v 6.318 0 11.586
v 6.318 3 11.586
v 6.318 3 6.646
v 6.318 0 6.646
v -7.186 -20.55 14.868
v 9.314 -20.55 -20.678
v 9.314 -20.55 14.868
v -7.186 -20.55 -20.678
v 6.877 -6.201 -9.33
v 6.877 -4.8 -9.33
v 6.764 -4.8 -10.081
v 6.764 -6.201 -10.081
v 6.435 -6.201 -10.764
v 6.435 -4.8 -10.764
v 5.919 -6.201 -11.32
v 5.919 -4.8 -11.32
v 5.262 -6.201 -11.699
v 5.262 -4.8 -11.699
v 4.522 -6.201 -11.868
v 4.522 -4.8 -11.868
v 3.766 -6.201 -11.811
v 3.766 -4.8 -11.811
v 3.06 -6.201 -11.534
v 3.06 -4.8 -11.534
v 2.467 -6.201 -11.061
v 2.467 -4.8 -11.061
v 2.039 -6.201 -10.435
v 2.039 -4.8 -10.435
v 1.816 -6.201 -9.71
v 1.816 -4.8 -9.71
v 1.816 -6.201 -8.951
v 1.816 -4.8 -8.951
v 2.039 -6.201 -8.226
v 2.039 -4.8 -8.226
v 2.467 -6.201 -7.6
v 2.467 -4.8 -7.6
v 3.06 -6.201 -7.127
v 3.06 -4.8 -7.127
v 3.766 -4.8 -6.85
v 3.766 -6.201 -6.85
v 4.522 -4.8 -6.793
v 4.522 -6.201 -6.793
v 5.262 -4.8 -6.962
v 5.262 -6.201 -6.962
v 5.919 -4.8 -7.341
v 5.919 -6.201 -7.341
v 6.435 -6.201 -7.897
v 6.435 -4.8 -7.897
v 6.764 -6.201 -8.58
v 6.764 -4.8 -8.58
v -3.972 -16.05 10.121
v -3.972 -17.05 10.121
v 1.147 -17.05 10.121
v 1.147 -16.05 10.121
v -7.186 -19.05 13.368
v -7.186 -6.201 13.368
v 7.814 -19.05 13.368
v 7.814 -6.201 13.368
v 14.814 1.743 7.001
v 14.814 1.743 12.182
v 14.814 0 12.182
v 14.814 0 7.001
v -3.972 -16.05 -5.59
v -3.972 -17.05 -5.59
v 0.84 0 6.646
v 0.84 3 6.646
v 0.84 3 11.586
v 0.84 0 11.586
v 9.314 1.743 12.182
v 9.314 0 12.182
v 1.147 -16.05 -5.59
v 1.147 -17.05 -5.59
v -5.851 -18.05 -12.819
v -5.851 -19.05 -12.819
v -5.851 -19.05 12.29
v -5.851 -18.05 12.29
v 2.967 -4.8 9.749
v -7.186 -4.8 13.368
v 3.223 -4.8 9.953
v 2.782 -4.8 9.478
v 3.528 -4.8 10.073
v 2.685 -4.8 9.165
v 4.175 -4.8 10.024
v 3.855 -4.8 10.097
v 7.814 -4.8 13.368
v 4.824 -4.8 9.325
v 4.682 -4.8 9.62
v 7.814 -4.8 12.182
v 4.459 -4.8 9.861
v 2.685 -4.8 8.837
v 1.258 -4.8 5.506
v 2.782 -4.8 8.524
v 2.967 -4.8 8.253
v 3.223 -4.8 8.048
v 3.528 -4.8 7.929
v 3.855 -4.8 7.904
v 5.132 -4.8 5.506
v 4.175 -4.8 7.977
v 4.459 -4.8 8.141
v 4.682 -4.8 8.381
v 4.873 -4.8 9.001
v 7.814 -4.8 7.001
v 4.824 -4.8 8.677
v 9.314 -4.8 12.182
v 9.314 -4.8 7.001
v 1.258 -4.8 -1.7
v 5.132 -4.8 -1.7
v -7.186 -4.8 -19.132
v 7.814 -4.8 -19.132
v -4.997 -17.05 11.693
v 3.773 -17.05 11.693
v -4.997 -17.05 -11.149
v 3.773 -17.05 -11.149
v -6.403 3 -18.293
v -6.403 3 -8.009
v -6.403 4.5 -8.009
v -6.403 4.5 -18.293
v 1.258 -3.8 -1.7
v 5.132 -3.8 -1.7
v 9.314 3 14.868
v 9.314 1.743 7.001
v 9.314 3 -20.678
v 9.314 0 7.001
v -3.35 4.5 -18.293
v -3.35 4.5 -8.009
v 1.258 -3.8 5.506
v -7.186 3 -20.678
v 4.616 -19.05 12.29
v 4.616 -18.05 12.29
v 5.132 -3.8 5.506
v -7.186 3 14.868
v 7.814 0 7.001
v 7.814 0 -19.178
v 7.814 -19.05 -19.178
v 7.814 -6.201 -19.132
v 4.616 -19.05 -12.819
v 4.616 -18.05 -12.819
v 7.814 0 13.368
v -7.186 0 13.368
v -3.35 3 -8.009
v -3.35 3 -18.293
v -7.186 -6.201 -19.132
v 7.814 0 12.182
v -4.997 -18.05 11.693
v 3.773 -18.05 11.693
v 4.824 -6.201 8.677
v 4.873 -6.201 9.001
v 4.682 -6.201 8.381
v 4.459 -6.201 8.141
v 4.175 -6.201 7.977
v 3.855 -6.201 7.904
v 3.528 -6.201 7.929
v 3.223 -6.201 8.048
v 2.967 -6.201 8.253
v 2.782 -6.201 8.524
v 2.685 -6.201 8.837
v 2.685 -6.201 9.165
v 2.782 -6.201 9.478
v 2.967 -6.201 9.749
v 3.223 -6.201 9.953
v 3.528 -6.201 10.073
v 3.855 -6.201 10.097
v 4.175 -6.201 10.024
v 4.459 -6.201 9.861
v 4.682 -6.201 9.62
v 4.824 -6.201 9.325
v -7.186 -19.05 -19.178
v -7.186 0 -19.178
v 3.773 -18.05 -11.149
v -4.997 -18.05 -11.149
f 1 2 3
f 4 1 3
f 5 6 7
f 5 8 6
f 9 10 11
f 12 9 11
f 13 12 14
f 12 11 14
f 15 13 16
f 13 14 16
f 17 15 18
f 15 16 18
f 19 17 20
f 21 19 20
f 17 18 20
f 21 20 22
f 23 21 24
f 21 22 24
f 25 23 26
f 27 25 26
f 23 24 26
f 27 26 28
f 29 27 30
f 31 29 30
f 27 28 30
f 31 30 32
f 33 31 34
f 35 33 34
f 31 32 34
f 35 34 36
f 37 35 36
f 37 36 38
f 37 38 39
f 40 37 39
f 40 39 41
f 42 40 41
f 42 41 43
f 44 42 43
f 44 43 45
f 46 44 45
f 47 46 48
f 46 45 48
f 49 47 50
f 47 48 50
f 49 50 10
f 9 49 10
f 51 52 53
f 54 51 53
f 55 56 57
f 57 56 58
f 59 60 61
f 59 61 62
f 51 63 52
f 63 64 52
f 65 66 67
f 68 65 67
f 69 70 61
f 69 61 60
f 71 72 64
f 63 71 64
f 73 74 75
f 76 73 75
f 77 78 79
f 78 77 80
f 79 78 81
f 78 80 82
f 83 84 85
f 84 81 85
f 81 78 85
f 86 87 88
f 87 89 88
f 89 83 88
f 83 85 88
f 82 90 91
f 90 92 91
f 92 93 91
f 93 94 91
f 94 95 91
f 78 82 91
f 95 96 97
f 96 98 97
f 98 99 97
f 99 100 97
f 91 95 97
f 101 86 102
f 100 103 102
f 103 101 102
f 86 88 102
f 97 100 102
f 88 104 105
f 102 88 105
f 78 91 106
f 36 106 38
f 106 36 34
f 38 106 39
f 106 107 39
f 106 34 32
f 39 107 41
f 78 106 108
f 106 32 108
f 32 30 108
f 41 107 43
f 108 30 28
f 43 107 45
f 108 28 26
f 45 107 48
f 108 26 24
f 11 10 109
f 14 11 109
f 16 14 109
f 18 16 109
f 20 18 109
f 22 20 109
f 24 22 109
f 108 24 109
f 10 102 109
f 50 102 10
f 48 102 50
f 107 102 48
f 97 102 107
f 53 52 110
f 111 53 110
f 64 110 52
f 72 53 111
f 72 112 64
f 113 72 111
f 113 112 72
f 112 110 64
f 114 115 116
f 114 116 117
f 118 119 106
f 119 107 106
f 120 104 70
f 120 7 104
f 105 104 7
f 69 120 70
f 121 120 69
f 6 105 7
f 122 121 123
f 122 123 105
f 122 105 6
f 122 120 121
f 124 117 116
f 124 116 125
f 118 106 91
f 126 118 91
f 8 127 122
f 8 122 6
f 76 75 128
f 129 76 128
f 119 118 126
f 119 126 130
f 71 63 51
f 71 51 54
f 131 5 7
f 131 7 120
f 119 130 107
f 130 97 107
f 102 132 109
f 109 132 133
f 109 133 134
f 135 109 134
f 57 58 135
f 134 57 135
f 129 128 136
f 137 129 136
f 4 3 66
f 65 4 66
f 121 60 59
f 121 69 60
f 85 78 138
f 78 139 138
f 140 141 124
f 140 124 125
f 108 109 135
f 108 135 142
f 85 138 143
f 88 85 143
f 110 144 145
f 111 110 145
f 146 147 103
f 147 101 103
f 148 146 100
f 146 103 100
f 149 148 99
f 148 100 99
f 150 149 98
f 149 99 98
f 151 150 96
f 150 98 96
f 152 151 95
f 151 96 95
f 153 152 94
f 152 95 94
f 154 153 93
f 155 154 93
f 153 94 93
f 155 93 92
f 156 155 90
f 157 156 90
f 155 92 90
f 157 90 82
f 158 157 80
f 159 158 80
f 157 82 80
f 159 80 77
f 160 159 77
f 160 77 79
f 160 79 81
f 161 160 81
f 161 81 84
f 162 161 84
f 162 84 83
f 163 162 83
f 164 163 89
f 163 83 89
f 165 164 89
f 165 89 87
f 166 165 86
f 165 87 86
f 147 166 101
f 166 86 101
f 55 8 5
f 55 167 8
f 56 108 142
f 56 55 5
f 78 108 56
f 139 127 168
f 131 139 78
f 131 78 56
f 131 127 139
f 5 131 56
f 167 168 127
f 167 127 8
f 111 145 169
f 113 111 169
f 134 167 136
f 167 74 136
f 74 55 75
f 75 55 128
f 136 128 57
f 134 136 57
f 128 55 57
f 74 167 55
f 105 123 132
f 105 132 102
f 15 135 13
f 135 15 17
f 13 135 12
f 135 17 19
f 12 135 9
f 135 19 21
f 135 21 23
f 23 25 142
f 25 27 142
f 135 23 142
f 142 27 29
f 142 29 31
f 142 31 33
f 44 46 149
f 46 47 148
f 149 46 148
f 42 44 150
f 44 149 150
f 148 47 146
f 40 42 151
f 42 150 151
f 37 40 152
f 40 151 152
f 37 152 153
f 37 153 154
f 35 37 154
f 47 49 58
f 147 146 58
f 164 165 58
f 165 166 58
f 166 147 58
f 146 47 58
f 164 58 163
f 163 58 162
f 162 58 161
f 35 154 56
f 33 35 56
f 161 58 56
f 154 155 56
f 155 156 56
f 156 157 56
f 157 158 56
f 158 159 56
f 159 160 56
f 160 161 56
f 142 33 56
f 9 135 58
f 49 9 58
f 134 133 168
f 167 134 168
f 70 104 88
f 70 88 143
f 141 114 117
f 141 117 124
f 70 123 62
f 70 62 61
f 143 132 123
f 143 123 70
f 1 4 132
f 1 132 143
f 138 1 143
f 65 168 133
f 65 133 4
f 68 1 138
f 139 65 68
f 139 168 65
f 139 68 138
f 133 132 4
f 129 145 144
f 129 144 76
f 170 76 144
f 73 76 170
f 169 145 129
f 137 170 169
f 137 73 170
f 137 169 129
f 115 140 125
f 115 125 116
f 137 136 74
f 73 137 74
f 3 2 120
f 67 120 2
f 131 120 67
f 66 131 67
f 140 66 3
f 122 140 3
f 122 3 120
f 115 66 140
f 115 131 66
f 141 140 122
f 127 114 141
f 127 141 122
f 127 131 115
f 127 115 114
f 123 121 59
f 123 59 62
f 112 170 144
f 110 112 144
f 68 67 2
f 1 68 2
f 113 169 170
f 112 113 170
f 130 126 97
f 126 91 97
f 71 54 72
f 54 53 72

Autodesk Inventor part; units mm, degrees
ref_plane "YZ Plane" through (0, 0, 0) normal (1, 0, 0) x (0, 1, 0)
ref_plane "XZ Plane" through (0, 0, 0) normal (0, 1, 0) x (-1, 0, 0)
ref_plane "XY Plane" through (0, 0, 0) normal (0, 0, 1) x (1, 0, 0)
sketch "Sketch1" plane through (0, 0, 0) normal (0, 1, 0) x (-1, 0, 0)
  line L0 (7.1862, 13.3676) -> (-7.8138, 13.3676)
  line L1 (-7.8138, 13.3676) -> (-7.8138, -19.1776)
  line L2 (-7.8138, -19.1776) -> (7.1862, -19.1776)
  line L3 (7.1862, -19.1776) -> (7.1862, 13.3676)
  point P0 (0, 0)
  dimension "d0" = 15
extrude "Extrusion1" add sketch "Sketch1" along normal blind 3
sketch "Sketch2" plane through (0, 3, 0) normal (0, 1, 0) x (1, 0, 0)
  line L0 (0.84, -11.5857) -> (6.3178, -11.5857)
  line L1 (6.3178, -11.5857) -> (6.3178, -6.6455)
  line L2 (6.3178, -6.6455) -> (0.84, -6.6455)
  line L3 (0.84, -6.6455) -> (0.84, -11.5857)
  point P0 (0, 0)
extrude "Extrusion2" cut sketch "Sketch2" against normal blind 4.5
sketch "Sketch3" plane through (0, 3, 0) normal (0, 1, 0) x (1, 0, 0)
  line L0 (-6.4027, 18.2927) -> (-3.3498, 18.2927)
  line L1 (-3.3498, 18.2927) -> (-3.3498, 8.0094)
  line L2 (-3.3498, 8.0094) -> (-6.4027, 8.0094)
  line L3 (-6.4027, 8.0094) -> (-6.4027, 18.2927)
  point P0 (0, 0)
extrude "Extrusion3" add sketch "Sketch3" along normal blind 1.5
sketch "Sketch4" plane through (-7.1862, 0, 13.3676) normal (0, 0, 1) x (1, 0, 0)
  line L0 (0, 3) -> (15, 3) projected
  line L1 (0, 3) -> (15, 3)
  line L2 (15, 3) -> (15, -19.0502)
  line L3 (15, -19.0502) -> (0, -19.0502)
  line L4 (0, -19.0502) -> (0, 3)
  point P0 (7.1862, 0)
extrude "Extrusion4" add sketch "Sketch4" along normal blind 1.5
sketch "Sketch5" plane through (-7.1862, 0, 13.3676) normal (0, 0, -1) x (-1, 0, 0)
  line L0 (-15, -19.0502) -> (-15, 0) projected
  line L1 (0, 0) -> (0, -19.0502) projected
  line L2 (-15, -6.2009) -> (0, -6.2009)
  line L3 (0, -6.2009) -> (0, -4.8004)
  line L4 (0, -4.8004) -> (-15, -4.8004)
  line L5 (-15, -4.8004) -> (-15, -6.2009)
  point P0 (-7.1862, 0)
extrude "Extrusion5" add sketch "Sketch5" along normal blind 32.5
sketch "Sketch6" plane through (7.8138, 0, -19.1776) normal (0, 0, -1) x (-1, 0, 0)
  line L0 (0, 0) -> (0, 3) projected
  line L1 (15, -6.2009) -> (15, -19.0502) projected
  line L2 (0, 3) -> (15, 3)
  line L3 (15, 3) -> (15, -19.0502)
  line L4 (15, -19.0502) -> (0, -19.0502)
  line L5 (0, -19.0502) -> (0, 3)
  point P0 (7.8138, 0)
extrude "Extrusion6" add sketch "Sketch6" along normal blind 1.5
sketch "Sketch7" plane through (-7.1862, -19.0502, -19.1776) normal (0, -1, 0) x (1, 0, 0)
  line L0 (15, -1.5) -> (15, 34.0452) projected
  line L1 (15, -1.5) -> (0, -1.5)
  line L2 (0, -1.5) -> (0, 34.0452)
  line L3 (0, 34.0452) -> (15, 34.0452)
  line L4 (15, 34.0452) -> (15, -1.5)
  point P0 (7.1862, 19.1776)
extrude "Extrusion7" add sketch "Sketch7" along normal blind 1.5
sketch "Sketch8" plane through (0, 3, 0) normal (0, 1, 0) x (1, 0, 0)
  point P0 (0, 0)
sketch "Sketch10" plane through (7.8138, 3, 14.8676) normal (1, 0, 0) x (0, 0, -1)
  line L0 (0, 0) -> (35.5452, 0) projected
  line L1 (35.5452, 0) -> (35.5452, -23.5502) projected
  line L2 (0, 0) -> (35.5452, 0)
  line L3 (35.5452, 0) -> (35.5452, -23.5502)
  line L4 (35.5452, -23.5502) -> (0, -23.5502)
  line L5 (0, -23.5502) -> (0, 0)
  point P0 (14.8676, -3)
extrude "Extrusion9" add sketch "Sketch10" along normal blind 1.5
sketch "Sketch11" plane through (9.3138, 3, 14.8676) normal (1, 0, 0) x (0, 0, -1)
  point P0 (14.8676, -3)
sketch "Sketch12" plane through (9.3138, 3, 14.8676) normal (1, 0, 0) x (0, 0, -1)
  line L0 (1.5, -7.8004) -> (34, -7.8004) projected
  line L1 (2.6857, -1.2569) -> (7.8665, -1.2569)
  line L2 (7.8665, -1.2569) -> (7.8665, -7.8004)
  line L3 (7.8665, -7.8004) -> (2.6857, -7.8004)
  line L4 (2.6857, -7.8004) -> (2.6857, -1.2569)
  point P0 (14.8676, -3)
  point P1 (2.6857, -7.8004)
extrude "Extrusion10" cut sketch "Sketch12" against normal blind 1.5
sketch "Sketch13" plane through (-7.1862, -19.0502, -19.1776) normal (0, 1, 0) x (1, 0, 0)
  line L0 (11.8023, -6.3584) -> (1.3351, -6.3584)
  line L1 (1.3351, -6.3584) -> (1.3351, -31.4677)
  line L2 (1.3351, -31.4677) -> (11.8023, -31.4677)
  line L3 (11.8023, -31.4677) -> (11.8023, -6.3584)
  point P0 (7.1862, -19.1776)
extrude "Extrusion11" add sketch "Sketch13" along normal blind 1
sketch "Sketch14" plane through (-7.1862, -18.0502, -19.1776) normal (0, 1, 0) x (1, 0, 0)
  line L0 (10.9591, -8.0288) -> (2.1896, -8.0288)
  line L1 (2.1896, -8.0288) -> (2.1896, -30.8703)
  line L2 (2.1896, -30.8703) -> (10.9591, -30.8703)
  line L3 (10.9591, -30.8703) -> (10.9591, -8.0288)
  point P0 (7.1862, -19.1776)
extrude "Extrusion12" add sketch "Sketch14" along normal blind 1
sketch "Sketch15" plane through (-7.1862, -4.8004, 13.3676) normal (0, 1, 0) x (1, 0, 0)
  line L0 (12.3187, 15.0671) -> (8.4438, 15.0671)
  line L1 (8.4438, 15.0671) -> (8.4438, 7.8611)
  line L2 (8.4438, 7.8611) -> (12.3187, 7.8611)
  line L3 (12.3187, 7.8611) -> (12.3187, 15.0671)
  point P0 (7.1862, 13.3676)
extrude "Extrusion13" add sketch "Sketch15" along normal blind 1
sketch "Sketch17" plane through (-7.1862, -17.0502, -19.1776) normal (0, 1, 0) x (1, 0, 0)
  line L0 (8.3336, -13.5877) -> (3.2144, -13.5877)
  line L1 (3.2144, -13.5877) -> (3.2144, -29.2984)
  line L2 (3.2144, -29.2984) -> (8.3336, -29.2984)
  line L3 (8.3336, -29.2984) -> (8.3336, -13.5877)
  point P0 (7.1862, -19.1776)
extrude "Extrusion15" add sketch "Sketch17" along normal blind 1
sketch "Sketch19" plane through (7.8138, 3, 14.8676) normal (1, 0, 0) x (0, 0, -1)
  line L0 (2.6857, -1.2569) -> (7.8665, -1.2569) projected
  line L1 (7.8665, -1.2569) -> (7.8665, -7.8004) projected
  line L2 (2.6857, -1.2569) -> (7.8665, -1.2569)
  line L3 (7.8665, -1.2569) -> (7.8665, -3)
  line L4 (7.8665, -3) -> (2.6857, -3)
  line L5 (2.6857, -3) -> (2.6857, -1.2569)
  point P0 (14.8676, -3)
extrude "Extrusion16" add sketch "Sketch19" along normal blind 7
sketch "Sketch20" plane through (-7.1862, -4.8004, 13.3676) normal (0, 1, 0) x (1, 0, 0)
  point P0 (7.1862, 13.3676)
sketch "Sketch21" plane through (-7.1862, -4.8004, 13.3676) normal (0, 1, 0) x (1, 0, 0)
  point P0 (7.1862, 13.3676)
sketch "Sketch22" plane through (-7.1862, -4.8004, 13.3676) normal (0, 1, 0) x (1, 0, 0)
  point P0 (7.1862, 13.3676)
sketch "Sketch23" plane through (-7.1862, -4.8004, 13.3676) normal (0, 1, 0) x (1, 0, 0)
  circle A0 centre (11.5182, 22.6981) radius 2.5447
  point P0 (7.1862, 13.3676)
extrude "Extrusion17" cut sketch "Sketch23" against normal blind 1.5
sketch "Sketch24" plane through (-7.1862, -4.8004, 13.3676) normal (0, 1, 0) x (1, 0, 0)
  point P0 (7.1862, 13.3676)
sketch "Sketch25" plane through (-7.1862, -4.8004, 13.3676) normal (0, 1, 0) x (1, 0, 0)
  point P0 (7.1862, 13.3676)
sketch "Sketch26" plane through (-7.1862, -4.8004, 13.3676) normal (0, 1, 0) x (1, 0, 0)
  point P0 (7.1862, 13.3676)
sketch "Sketch27" plane through (-7.1862, -4.8004, 13.3676) normal (0, 1, 0) x (1, 0, 0)
  line L0 (10.9591, 1.6749) -> (10.9591, 24.5164) projected
  circle A0 centre (10.9591, 4.3668) radius 1.0997
  point P0 (7.1862, 13.3676)
extrude "Extrusion18" cut sketch "Sketch27" against normal blind 1.5
sketch "Sketch28" plane through (0, 4.5, 0) normal (0, 1, 0) x (1, 0, 0)
  point P0 (0, 0)
properties part number "Atas"
